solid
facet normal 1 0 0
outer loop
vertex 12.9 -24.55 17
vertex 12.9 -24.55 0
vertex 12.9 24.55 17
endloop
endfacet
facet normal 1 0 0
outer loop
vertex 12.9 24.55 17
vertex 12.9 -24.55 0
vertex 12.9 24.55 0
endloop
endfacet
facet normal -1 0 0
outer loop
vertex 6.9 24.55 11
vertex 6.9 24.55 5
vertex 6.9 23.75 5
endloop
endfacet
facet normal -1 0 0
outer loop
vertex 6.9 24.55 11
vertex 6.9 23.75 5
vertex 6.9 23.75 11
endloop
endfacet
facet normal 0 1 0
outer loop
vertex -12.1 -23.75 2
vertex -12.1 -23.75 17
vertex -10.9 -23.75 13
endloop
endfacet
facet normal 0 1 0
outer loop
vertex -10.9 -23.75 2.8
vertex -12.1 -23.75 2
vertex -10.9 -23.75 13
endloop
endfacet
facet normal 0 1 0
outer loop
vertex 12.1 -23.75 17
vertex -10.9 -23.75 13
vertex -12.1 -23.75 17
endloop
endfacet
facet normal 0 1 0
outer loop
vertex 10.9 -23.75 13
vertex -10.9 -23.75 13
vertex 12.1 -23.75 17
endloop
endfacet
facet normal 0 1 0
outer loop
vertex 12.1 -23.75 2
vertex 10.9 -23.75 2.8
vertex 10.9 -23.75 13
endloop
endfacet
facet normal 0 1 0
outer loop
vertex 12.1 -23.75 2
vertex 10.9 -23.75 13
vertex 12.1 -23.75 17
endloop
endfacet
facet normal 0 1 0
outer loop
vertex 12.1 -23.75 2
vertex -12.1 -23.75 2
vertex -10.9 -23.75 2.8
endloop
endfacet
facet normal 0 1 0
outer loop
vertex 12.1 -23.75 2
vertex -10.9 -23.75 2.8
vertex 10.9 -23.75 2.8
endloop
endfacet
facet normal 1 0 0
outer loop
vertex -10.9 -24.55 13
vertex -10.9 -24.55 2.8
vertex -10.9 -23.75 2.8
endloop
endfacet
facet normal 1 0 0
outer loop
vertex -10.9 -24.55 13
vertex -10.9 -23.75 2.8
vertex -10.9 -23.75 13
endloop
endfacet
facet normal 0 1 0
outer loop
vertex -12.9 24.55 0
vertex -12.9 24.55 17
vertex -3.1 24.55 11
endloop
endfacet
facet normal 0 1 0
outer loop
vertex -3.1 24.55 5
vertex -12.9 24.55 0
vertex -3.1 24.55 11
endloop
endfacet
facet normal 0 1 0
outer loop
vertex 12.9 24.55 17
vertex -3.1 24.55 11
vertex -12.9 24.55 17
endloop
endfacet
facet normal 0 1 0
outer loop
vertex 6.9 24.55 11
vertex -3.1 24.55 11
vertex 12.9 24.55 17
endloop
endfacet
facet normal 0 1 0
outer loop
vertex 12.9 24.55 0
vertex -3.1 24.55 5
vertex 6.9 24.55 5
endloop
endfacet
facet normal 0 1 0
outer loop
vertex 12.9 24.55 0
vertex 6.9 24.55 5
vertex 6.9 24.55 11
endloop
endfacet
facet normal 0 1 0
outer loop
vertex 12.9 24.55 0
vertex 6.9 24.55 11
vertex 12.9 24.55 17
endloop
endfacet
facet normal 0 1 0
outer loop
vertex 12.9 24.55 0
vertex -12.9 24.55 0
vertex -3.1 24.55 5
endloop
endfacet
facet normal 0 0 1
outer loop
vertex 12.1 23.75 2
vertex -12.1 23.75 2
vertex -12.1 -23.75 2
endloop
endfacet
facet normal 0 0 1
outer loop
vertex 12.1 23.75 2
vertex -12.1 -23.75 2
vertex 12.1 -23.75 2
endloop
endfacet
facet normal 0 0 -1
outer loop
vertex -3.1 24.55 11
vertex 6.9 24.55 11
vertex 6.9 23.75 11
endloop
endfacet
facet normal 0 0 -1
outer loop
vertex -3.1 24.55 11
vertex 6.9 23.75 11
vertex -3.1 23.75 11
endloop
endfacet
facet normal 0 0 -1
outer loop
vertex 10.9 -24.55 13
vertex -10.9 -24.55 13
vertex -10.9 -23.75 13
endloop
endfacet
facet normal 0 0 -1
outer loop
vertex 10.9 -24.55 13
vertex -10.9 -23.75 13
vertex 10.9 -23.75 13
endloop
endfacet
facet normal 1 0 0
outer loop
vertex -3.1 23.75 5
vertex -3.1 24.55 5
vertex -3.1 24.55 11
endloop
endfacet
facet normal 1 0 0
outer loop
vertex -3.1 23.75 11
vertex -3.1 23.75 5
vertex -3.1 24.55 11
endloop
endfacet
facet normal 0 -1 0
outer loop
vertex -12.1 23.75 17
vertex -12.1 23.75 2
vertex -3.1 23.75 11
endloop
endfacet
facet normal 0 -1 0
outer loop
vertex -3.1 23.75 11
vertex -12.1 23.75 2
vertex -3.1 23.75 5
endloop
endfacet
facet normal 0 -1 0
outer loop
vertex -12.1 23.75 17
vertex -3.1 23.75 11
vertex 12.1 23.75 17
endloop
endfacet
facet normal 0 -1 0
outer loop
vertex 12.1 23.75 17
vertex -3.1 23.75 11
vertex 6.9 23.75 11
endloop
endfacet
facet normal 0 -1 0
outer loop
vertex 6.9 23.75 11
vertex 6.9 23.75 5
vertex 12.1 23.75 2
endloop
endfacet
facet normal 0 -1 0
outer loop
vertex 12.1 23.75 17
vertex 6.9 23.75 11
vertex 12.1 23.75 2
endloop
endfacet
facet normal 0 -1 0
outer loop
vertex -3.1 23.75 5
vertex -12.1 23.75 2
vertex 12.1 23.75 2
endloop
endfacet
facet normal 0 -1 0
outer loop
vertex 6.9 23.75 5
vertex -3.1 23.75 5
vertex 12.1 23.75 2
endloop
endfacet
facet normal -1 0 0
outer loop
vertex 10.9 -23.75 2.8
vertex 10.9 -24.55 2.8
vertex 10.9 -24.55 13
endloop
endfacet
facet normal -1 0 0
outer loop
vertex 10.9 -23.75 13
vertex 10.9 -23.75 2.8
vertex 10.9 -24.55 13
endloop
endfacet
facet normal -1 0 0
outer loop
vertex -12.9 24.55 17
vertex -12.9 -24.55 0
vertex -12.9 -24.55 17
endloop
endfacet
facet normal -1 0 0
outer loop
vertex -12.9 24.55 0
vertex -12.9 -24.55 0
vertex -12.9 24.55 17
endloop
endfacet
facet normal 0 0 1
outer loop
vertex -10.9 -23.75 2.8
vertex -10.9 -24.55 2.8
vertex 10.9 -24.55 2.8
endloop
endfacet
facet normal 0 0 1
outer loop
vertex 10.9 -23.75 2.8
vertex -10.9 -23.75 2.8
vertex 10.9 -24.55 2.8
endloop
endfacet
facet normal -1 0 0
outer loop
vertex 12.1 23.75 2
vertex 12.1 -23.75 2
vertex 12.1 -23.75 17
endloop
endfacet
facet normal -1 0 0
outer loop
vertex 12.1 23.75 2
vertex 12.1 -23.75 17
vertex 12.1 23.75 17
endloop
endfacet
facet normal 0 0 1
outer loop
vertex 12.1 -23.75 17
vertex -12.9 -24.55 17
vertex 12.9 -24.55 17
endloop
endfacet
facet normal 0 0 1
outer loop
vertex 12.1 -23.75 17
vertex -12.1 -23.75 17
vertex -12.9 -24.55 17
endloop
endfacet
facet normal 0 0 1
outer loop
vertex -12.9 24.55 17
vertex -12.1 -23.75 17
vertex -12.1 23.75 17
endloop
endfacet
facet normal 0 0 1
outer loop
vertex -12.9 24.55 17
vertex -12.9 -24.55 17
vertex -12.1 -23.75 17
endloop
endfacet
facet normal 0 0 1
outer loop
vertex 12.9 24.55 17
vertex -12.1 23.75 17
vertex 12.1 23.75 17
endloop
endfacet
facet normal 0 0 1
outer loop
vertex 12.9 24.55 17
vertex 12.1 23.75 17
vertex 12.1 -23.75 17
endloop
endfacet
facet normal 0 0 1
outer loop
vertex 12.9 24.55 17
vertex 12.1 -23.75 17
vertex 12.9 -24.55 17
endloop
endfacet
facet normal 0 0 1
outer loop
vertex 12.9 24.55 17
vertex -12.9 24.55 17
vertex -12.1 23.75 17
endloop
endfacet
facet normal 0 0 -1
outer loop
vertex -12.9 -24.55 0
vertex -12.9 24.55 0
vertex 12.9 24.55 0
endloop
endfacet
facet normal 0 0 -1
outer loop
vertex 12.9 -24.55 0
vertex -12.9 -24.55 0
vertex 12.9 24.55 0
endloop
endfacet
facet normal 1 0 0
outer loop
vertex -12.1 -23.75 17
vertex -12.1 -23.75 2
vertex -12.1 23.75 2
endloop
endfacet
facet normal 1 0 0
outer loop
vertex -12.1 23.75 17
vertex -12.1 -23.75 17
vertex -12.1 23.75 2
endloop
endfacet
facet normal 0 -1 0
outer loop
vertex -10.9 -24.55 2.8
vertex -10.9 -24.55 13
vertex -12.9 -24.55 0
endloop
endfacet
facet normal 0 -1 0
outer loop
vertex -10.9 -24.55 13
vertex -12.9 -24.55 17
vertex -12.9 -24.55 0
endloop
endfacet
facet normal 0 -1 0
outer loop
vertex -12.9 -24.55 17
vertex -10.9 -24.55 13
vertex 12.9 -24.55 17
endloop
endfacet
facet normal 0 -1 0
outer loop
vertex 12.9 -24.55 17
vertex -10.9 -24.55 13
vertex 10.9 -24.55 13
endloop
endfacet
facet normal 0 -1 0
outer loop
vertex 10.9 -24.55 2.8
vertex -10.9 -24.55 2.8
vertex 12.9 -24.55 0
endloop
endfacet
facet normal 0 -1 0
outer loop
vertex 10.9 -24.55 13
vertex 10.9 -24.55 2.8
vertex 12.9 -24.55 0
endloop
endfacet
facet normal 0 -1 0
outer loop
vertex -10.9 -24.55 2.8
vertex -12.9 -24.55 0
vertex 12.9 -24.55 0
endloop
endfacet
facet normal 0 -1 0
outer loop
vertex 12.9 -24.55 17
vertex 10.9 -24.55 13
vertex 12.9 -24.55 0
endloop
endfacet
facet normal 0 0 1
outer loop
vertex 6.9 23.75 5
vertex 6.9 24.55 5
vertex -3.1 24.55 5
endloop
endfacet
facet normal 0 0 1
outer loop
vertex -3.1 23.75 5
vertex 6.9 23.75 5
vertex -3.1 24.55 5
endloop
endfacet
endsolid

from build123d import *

# Parameters (mm, degrees)
F0_W     = 25.8
F0_H     = 49.1
F0_W_2   = 24.2
F0_H_2   = 47.5
F1_DEPTH = 2
F2_W     = 25.8
F2_H     = 49.1
F2_W_2   = 24.2
F2_H_2   = 47.5
F3_DEPTH = 15
F4_W     = 21.8
F4_H     = 10.2
F5_DEPTH = 0.8
F6_W     = 10
F6_H     = 6
F7_DEPTH = 0.8


with BuildPart() as f1:
    # F0 (on Top) → F1 (new body)
    with BuildSketch(Plane.XY):
        Rectangle(F0_W, F0_H)
        Rectangle(F0_W_2, F0_H_2, mode=Mode.SUBTRACT)
        Rectangle(F0_W_2, F0_H_2)
    extrude(amount=F1_DEPTH)

    # F2 (on face) → F3 (join)
    with BuildSketch(Plane.XY.offset(2)):
        Rectangle(F2_W, F2_H)
        Rectangle(F2_W_2, F2_H_2, mode=Mode.SUBTRACT)
    extrude(amount=F3_DEPTH)

    # F4 (on face) → F5 (cut, through all)
    with BuildSketch(Plane.XZ.offset(24.55)):
        with Locations((0, 7.9)):
            Rectangle(F4_W, F4_H)
    extrude(amount=-F5_DEPTH, mode=Mode.SUBTRACT)

    # F6 (on face) → F7 (cut, through all)
    with BuildSketch(Plane(origin=(0, 24.55, 0), x_dir=(-1, 0, 0), z_dir=(0, 1, 0))):
        with Locations((-1.9, 8)):
            Rectangle(F6_W, F6_H)
    extrude(amount=-F7_DEPTH, mode=Mode.SUBTRACT)


solid = f1.part
